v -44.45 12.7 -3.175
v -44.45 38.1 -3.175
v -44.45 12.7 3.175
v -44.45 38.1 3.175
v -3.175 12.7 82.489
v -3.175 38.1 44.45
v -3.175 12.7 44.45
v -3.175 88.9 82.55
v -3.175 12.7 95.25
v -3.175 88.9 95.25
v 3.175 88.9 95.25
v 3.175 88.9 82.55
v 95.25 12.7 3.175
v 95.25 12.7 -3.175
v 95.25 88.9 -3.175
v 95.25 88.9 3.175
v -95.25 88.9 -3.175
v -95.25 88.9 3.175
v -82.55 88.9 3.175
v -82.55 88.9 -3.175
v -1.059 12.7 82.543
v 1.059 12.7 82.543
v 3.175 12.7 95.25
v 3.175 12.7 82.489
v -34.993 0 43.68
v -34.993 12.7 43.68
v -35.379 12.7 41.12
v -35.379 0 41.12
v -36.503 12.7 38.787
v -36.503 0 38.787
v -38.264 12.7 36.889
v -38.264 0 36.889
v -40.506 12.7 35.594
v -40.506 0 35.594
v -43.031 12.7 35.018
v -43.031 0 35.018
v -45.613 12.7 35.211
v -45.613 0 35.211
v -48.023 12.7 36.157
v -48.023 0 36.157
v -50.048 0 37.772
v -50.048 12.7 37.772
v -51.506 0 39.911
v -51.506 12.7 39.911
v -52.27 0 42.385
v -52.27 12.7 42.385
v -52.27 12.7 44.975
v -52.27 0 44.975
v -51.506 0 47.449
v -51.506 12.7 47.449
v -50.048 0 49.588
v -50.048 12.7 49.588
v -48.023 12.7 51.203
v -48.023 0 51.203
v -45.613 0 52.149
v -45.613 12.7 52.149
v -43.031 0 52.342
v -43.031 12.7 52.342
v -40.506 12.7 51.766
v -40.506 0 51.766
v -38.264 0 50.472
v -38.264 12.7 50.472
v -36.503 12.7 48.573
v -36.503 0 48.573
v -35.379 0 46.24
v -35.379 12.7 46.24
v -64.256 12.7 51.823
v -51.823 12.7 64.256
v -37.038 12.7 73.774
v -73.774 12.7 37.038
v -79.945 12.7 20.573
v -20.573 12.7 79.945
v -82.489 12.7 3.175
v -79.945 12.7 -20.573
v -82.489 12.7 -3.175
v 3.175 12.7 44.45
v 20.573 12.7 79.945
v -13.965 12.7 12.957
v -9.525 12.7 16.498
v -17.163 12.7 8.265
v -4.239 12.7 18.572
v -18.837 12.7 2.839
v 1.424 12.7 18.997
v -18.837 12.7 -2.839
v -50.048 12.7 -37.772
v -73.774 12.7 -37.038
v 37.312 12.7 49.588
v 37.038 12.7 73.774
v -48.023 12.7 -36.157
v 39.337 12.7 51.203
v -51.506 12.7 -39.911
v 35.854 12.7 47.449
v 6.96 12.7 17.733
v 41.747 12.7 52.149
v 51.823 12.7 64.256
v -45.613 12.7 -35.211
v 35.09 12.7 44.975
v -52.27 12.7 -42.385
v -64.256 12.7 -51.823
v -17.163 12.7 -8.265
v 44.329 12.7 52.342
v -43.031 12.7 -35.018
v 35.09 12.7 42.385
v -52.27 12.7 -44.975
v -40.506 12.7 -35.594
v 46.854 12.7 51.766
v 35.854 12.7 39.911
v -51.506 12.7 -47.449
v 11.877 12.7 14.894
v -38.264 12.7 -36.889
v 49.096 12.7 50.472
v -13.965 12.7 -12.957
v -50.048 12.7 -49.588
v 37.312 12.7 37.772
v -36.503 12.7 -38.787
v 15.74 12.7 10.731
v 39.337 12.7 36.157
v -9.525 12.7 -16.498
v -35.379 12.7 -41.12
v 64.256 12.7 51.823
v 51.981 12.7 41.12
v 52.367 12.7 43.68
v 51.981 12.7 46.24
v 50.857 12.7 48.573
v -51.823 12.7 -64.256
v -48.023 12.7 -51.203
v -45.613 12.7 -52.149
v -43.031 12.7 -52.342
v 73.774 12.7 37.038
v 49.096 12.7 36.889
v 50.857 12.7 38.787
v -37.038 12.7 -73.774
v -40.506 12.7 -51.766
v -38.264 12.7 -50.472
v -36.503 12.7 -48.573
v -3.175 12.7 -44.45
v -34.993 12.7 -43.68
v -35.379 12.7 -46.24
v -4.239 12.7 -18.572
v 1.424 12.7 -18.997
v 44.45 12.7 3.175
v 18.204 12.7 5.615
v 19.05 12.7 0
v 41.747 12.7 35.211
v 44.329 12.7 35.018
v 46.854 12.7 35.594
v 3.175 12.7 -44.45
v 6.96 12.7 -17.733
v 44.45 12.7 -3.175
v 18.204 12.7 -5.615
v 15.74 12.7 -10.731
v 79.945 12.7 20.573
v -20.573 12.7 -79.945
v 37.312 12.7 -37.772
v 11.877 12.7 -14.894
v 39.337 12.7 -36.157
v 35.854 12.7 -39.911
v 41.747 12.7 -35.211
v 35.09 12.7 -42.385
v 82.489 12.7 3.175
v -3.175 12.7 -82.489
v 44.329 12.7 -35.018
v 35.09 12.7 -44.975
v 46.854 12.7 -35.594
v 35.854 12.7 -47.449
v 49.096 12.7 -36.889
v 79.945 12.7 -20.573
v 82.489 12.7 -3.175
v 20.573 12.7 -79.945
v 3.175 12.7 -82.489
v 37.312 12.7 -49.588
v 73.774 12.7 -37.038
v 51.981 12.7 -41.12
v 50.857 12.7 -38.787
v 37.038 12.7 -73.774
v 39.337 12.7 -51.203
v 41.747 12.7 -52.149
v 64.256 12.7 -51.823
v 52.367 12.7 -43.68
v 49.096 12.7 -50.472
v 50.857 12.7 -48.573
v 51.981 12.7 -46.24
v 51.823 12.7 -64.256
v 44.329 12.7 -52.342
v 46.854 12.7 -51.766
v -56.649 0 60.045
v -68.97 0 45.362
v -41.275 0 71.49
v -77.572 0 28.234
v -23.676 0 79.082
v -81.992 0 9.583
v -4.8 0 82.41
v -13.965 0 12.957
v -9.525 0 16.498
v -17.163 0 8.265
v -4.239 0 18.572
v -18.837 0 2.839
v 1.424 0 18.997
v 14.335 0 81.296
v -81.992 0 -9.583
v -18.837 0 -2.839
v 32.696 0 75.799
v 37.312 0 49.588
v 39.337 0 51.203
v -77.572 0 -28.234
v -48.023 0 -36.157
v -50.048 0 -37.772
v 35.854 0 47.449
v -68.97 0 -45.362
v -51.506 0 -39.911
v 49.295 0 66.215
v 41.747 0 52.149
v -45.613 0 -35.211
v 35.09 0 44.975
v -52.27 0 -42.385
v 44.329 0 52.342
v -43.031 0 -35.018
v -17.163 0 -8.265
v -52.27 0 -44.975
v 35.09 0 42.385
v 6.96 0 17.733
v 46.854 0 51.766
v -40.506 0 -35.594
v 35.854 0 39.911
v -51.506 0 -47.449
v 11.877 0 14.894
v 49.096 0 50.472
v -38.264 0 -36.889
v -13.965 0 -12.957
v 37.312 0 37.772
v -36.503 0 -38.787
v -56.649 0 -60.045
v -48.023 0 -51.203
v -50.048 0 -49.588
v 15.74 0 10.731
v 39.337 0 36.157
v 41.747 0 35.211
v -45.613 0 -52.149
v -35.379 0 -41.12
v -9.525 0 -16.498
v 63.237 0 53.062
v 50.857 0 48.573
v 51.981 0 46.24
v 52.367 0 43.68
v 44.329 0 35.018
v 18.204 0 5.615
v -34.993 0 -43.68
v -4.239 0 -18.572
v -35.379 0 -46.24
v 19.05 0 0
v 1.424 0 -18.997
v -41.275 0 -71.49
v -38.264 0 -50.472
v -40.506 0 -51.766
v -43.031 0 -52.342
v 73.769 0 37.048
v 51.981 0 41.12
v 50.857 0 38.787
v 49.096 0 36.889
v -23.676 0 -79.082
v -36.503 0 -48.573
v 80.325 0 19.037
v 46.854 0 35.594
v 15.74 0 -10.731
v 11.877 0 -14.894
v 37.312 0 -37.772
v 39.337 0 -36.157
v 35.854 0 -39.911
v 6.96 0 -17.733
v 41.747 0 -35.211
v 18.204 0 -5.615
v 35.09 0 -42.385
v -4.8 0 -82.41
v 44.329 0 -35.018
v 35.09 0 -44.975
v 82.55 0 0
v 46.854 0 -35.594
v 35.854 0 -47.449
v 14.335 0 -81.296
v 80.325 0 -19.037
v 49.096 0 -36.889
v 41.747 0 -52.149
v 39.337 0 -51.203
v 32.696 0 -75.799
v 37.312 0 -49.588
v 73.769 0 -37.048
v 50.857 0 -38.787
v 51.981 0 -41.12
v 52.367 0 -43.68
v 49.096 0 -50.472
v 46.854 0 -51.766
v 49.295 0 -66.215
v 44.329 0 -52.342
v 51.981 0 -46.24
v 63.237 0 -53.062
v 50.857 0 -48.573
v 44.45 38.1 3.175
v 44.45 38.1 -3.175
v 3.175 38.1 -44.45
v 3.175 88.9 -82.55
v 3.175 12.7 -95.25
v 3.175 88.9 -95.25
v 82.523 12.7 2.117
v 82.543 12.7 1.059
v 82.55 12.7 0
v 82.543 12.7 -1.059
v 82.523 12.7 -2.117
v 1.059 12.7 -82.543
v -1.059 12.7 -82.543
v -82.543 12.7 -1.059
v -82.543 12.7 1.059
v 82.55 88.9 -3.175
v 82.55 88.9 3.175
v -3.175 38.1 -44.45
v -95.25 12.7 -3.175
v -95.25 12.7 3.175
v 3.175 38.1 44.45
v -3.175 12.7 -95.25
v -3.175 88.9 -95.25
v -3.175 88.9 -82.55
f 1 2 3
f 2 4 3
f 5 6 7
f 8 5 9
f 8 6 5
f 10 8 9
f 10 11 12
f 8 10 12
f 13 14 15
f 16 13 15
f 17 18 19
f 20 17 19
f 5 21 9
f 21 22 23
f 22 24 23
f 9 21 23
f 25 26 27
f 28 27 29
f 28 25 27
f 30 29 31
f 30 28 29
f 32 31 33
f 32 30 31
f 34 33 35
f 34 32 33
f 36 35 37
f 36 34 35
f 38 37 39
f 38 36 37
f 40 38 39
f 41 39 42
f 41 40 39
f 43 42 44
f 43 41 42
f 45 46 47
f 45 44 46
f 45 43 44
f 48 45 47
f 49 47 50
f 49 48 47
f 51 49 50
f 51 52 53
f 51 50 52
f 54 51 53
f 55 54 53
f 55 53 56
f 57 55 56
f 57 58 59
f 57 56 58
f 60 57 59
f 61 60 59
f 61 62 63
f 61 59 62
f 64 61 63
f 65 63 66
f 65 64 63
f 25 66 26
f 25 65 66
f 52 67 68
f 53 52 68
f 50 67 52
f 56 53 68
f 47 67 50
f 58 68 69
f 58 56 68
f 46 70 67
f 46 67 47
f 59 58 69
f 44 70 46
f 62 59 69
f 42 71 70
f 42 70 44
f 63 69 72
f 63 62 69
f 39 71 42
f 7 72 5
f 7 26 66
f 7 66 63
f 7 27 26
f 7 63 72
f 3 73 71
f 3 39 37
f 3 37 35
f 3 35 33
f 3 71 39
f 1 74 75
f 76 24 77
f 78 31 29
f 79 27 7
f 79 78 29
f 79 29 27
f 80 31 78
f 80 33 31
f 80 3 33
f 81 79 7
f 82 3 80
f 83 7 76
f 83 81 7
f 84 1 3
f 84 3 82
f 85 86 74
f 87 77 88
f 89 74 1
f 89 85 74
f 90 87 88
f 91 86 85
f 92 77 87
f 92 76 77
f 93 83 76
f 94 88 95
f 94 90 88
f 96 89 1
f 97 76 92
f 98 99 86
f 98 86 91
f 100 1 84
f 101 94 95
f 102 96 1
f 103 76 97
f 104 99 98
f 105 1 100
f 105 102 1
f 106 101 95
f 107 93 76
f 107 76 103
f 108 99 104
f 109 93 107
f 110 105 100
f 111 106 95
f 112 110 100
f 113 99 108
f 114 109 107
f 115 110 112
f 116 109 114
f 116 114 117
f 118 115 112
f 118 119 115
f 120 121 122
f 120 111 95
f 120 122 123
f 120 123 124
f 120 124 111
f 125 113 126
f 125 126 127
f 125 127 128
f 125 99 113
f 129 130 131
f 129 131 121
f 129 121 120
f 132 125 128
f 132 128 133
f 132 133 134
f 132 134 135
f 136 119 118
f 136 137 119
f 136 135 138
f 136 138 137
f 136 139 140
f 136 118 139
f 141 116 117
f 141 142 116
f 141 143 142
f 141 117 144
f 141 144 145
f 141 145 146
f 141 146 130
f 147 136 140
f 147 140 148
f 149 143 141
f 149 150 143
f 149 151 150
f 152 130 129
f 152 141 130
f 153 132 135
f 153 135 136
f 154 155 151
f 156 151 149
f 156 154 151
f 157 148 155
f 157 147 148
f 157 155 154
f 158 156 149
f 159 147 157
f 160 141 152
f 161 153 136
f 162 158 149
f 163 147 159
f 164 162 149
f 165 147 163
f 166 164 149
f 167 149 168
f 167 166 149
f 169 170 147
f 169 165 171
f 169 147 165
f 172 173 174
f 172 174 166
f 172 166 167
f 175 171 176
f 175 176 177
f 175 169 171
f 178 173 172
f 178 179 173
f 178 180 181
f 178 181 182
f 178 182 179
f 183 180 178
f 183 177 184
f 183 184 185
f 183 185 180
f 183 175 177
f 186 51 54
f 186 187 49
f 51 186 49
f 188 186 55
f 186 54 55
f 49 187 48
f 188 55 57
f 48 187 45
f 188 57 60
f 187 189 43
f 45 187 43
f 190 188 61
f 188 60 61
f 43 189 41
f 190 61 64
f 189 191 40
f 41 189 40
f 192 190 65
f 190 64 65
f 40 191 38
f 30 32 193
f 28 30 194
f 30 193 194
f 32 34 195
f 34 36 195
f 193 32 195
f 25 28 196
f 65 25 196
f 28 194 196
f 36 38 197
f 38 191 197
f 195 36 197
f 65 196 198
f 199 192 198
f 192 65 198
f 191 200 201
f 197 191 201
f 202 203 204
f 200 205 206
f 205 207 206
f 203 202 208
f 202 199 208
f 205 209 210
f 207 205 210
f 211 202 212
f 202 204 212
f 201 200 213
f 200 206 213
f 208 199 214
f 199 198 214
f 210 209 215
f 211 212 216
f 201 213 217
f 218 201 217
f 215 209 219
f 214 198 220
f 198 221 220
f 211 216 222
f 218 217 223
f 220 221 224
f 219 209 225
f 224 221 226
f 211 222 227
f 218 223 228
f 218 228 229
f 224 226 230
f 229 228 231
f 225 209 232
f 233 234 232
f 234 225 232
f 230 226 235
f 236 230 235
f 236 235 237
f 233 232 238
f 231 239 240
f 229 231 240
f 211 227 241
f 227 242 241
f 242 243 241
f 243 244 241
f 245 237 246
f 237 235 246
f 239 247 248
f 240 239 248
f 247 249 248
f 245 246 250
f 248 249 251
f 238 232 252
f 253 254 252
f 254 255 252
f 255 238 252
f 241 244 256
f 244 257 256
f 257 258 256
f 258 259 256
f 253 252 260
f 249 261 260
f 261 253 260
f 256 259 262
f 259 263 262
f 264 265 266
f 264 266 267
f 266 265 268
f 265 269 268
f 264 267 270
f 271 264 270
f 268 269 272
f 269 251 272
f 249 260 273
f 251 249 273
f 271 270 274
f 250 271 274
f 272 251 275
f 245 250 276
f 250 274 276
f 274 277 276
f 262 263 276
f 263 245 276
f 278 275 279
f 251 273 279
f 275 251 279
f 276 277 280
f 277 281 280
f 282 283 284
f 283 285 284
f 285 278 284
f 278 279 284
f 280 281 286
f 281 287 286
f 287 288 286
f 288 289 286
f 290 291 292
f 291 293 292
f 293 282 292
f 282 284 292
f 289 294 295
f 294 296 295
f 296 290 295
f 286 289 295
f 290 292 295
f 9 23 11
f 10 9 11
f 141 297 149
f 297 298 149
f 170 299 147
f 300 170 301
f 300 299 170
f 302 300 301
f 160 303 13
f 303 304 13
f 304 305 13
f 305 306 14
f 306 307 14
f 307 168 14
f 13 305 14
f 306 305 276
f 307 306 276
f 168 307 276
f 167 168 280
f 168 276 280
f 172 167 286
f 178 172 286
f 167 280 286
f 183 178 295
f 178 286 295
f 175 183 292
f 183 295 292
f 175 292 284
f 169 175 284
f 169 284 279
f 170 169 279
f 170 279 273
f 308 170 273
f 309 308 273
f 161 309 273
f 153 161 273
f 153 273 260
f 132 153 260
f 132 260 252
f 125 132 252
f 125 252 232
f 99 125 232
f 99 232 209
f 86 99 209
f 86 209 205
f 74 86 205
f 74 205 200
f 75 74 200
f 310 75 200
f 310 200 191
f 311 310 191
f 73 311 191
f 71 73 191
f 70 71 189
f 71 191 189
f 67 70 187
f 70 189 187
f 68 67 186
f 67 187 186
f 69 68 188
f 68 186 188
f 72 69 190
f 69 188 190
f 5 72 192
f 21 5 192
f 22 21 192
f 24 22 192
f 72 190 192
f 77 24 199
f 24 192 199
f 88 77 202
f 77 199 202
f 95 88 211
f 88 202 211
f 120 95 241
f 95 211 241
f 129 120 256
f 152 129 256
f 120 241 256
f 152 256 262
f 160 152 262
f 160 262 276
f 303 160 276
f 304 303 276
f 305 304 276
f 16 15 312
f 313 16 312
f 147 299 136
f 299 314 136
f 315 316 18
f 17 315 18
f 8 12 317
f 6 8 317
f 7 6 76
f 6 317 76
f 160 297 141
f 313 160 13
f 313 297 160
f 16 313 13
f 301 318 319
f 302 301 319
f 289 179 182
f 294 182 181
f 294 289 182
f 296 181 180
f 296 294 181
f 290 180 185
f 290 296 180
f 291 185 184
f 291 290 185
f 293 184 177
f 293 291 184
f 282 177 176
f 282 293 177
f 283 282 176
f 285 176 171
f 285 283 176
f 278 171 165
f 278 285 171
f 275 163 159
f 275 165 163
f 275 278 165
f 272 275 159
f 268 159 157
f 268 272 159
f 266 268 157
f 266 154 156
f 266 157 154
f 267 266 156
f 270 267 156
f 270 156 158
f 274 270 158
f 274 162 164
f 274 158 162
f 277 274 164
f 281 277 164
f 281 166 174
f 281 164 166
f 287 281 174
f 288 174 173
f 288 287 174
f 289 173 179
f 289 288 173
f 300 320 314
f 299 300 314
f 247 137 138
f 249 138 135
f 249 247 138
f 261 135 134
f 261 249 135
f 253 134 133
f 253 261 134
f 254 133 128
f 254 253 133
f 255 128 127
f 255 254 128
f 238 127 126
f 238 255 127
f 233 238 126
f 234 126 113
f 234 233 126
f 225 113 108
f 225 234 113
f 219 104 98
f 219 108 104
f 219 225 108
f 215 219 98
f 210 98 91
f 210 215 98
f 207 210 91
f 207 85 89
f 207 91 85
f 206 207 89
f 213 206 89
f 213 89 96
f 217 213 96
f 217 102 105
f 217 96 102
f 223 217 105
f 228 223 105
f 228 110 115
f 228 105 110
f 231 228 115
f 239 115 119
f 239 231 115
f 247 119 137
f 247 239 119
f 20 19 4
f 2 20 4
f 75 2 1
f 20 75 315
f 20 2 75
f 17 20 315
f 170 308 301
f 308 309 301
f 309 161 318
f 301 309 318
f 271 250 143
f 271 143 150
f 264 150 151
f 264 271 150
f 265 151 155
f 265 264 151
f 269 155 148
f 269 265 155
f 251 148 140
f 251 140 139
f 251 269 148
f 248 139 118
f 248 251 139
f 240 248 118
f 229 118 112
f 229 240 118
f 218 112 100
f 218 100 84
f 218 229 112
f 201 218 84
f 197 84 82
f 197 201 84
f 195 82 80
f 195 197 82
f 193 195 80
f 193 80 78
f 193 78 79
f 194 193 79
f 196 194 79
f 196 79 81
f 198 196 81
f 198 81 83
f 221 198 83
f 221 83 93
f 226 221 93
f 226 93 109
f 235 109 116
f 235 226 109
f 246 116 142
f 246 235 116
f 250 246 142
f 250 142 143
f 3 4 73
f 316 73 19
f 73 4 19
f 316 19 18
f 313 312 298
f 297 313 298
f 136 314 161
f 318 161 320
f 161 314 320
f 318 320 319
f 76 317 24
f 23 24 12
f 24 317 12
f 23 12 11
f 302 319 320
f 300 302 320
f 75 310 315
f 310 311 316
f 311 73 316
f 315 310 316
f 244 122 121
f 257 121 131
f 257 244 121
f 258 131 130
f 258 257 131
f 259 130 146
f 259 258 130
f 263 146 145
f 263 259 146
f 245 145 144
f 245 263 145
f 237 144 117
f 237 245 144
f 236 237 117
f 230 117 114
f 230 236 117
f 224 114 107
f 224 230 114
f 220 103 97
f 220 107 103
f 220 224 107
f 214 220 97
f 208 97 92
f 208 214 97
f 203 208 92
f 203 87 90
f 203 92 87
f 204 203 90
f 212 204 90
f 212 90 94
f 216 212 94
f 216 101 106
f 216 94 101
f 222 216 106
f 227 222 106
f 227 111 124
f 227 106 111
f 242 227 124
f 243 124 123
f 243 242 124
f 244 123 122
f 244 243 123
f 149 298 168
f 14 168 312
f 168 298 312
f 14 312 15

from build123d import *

# Parameters (mm, degrees)
SKETCH3_R           = 82.55
SKETCH3_R_2         = 19.05
BOSS_EXTRUDE2_DEPTH = 12.7
BOSS_EXTRUDE3_DEPTH = 3.175
CIRPATTERN1_COUNT   = 4
SKETCH8_R           = 8.686637198
CUT_EXTRUDE6_DEPTH  = 89.9


with BuildPart() as part:
    # Sketch3 → Boss-Extrude2 (new body)
    with BuildSketch(Plane(origin=(0, 0, 0), x_dir=(1, 0, 0), z_dir=(0, 1, 0))):
        Circle(SKETCH3_R)
        Circle(SKETCH3_R_2, mode=Mode.SUBTRACT)
    extrude(amount=BOSS_EXTRUDE2_DEPTH)

    # Sketch5 → Boss-Extrude3 (add, symmetric)
    with BuildSketch(Plane(origin=(0, 0, 0), x_dir=(0, 0, -1), z_dir=(1, 0, 0))):
        Polygon((-82.55, 88.9), (-44.45, 38.1), (-44.45, 12.7), (-95.25, 12.7), (-95.25, 88.9), align=None)
    boss_extrude3 = extrude(amount=BOSS_EXTRUDE3_DEPTH, both=True)

    # CirPattern1: Boss-Extrude3 ×4 about axis
    cirpattern1_axis = Axis((0, 0, 0), (0, 1, 0))
    for i in range(1, CIRPATTERN1_COUNT):
        add(boss_extrude3.rotate(cirpattern1_axis, i * 360 / CIRPATTERN1_COUNT))

    # Sketch8 → Cut-Extrude6 (cut, through all)
    with BuildSketch(Plane(origin=(0, 0, 0), x_dir=(1, 0, 0), z_dir=(0, 1, 0))):
        with Locations((43.68002845, -43.68002845)):
            Circle(SKETCH8_R)
        with Locations((-43.68002845, -43.68002845)):
            Circle(SKETCH8_R)
        with Locations((-43.68002845, 43.68002845)):
            Circle(SKETCH8_R)
        with Locations((43.68002845, 43.68002845)):
            Circle(SKETCH8_R)
    extrude(amount=CUT_EXTRUDE6_DEPTH, mode=Mode.SUBTRACT)


solid = part.part
